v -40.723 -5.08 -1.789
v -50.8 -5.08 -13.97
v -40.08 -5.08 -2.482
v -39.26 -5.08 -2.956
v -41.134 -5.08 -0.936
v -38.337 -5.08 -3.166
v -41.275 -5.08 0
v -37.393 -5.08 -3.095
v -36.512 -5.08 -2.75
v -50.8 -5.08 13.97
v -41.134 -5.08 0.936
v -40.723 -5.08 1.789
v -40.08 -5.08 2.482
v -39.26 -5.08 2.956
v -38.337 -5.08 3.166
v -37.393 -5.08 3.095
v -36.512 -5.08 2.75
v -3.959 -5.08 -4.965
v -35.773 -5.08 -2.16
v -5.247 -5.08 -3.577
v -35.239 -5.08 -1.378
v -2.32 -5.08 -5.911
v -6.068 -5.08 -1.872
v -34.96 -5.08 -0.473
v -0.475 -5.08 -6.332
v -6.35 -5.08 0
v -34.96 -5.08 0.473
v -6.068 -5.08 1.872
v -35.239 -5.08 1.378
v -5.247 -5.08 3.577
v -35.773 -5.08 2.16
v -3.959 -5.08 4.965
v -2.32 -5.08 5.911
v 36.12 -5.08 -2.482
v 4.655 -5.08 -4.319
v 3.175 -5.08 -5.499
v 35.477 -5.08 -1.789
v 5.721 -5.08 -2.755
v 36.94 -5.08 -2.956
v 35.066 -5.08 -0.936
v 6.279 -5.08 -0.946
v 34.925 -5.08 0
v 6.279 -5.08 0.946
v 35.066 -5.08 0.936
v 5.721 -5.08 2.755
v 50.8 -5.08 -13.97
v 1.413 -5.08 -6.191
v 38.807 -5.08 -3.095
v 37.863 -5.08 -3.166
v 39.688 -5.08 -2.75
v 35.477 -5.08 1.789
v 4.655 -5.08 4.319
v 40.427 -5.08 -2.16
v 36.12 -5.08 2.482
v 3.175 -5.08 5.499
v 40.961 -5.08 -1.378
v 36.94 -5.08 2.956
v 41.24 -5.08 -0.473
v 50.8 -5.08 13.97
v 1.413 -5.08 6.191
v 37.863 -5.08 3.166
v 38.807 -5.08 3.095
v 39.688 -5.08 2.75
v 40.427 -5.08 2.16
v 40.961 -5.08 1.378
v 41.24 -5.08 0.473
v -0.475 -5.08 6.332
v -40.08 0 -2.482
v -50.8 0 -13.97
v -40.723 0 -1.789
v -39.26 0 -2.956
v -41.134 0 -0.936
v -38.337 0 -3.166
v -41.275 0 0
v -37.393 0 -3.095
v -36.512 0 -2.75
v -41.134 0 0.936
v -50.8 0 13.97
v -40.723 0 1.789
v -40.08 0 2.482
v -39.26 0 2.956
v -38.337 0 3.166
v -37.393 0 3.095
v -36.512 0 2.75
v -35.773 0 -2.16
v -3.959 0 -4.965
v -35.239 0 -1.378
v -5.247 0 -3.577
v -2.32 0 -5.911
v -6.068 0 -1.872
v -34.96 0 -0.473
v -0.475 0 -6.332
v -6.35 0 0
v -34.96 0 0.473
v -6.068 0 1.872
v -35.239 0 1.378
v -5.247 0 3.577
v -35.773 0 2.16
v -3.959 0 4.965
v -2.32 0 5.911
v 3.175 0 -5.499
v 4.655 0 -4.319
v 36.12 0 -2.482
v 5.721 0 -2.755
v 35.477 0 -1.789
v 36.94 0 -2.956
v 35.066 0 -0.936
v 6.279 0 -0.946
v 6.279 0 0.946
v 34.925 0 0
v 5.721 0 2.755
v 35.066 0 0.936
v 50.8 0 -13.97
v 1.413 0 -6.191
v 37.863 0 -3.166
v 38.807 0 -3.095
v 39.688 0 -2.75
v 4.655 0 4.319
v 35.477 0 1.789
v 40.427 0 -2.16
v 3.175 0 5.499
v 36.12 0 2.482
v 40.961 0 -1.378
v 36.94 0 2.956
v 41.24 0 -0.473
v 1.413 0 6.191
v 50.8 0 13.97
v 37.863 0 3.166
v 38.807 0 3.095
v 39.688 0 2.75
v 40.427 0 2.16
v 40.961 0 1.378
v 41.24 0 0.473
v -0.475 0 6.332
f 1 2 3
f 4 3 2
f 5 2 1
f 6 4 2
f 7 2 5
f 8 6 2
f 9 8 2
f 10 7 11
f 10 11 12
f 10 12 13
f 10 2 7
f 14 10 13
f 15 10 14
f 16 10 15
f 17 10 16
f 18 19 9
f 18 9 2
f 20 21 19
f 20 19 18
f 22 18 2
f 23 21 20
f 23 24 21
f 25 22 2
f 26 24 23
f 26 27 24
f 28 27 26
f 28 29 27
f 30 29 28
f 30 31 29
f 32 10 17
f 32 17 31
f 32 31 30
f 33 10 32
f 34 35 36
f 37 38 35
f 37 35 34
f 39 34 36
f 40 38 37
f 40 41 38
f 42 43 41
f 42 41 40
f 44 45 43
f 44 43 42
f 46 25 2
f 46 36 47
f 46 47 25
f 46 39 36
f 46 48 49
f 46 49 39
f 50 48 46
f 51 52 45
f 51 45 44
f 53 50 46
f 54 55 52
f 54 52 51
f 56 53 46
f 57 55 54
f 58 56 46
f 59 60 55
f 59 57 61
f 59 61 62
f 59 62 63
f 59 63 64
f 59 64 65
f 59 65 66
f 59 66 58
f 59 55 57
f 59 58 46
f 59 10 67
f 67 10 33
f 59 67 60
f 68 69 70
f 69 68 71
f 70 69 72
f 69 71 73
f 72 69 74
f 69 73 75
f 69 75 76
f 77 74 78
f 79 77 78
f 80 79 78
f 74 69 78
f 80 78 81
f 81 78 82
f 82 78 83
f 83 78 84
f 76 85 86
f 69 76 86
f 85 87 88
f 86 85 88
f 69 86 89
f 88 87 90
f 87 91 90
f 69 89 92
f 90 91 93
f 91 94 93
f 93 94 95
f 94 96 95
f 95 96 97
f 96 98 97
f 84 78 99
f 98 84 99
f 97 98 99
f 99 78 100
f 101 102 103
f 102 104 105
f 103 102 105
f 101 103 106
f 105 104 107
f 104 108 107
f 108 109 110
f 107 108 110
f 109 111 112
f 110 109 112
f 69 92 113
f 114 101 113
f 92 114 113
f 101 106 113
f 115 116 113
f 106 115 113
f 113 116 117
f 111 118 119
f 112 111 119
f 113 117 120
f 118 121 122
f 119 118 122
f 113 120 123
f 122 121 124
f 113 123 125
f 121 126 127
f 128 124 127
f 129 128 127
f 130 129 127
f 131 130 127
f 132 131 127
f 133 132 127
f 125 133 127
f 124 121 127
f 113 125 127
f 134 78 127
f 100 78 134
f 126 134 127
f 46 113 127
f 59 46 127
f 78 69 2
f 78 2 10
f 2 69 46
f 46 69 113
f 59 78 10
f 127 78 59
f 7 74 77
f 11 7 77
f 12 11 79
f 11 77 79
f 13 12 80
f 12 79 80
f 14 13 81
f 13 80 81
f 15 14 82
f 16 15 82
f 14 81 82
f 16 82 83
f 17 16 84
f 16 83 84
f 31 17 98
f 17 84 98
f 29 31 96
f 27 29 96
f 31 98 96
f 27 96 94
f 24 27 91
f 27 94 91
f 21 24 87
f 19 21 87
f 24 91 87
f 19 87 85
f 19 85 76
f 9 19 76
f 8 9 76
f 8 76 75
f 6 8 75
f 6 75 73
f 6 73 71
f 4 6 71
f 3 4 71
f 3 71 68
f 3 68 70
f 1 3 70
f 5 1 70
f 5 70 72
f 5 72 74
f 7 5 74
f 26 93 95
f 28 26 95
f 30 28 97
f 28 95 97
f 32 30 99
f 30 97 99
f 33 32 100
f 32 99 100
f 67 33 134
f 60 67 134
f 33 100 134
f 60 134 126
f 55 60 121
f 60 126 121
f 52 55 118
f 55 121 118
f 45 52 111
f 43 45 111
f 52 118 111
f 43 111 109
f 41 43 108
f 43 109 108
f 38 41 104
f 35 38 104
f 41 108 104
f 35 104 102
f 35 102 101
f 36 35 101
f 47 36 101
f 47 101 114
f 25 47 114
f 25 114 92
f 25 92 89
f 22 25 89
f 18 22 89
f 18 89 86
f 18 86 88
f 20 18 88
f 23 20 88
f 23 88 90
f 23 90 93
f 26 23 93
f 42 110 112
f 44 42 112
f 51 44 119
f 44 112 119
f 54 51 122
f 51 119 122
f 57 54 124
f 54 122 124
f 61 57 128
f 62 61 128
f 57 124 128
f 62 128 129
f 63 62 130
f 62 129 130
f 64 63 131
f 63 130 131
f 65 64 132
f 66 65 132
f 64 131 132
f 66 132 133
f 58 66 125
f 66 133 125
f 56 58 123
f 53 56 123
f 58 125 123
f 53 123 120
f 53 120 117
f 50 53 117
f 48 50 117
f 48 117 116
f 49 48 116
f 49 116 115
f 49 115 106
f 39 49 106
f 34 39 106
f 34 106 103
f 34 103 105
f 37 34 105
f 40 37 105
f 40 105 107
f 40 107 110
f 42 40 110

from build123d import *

# Parameters (mm, degrees)
F0_W     = 101.6
F0_H     = 27.94
F1_DEPTH = 5.08
F3_D     = 6.35
F5_D     = 12.7


with BuildPart() as f1:
    # F0 (on Front) → F1 (new body)
    with BuildSketch(Plane.XZ):
        Rectangle(F0_W, F0_H)
    extrude(amount=F1_DEPTH)

    # F3 (through all)
    with Locations(Plane.XZ.offset(5.08)):
        with Locations((-38.1, 0), (38.1, 0)):
            Hole(F3_D / 2)

    # F5 (through all)
    with Locations(Plane.XZ.offset(5.08)):
        with Locations((0, 0)):
            Hole(F5_D / 2)


solid = f1.part
